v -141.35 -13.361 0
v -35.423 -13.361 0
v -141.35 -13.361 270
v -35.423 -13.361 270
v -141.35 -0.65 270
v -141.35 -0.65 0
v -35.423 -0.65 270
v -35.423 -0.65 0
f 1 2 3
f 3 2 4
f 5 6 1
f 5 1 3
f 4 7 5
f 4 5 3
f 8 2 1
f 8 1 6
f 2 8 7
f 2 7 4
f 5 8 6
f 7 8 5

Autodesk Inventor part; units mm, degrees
ref_plane "YZ Plane" through (0, 0, 0) normal (1, 0, 0) x (0, 1, 0)
ref_plane "XZ Plane" through (0, 0, 0) normal (0, 1, 0) x (-1, 0, 0)
ref_plane "XY Plane" through (0, 0, 0) normal (0, 0, 1) x (1, 0, 0)
sketch "Sketch1" plane through (0, 0, 0) normal (0, 0, 1) x (1, 0, 0)
  line L0 (-135, -7) -> (-35.423, -7) projected
  line L1 (-128.65, -70.65) -> (-128.65, -7) projected
  line L2 (135, -70.65) -> (-135, -70.65) projected
  line L3 (-128.65, -7) -> (-35.423, -7)
  line L4 (-35.423, -7) -> (-35.423, -13.3614)
  line L5 (-35.423, -13.3614) -> (-128.65, -13.3614)
  line L6 (-128.65, -13.3614) -> (-128.65, -7)
  point P0 (0, 0)
extrude "Extrusion1" add sketch "Sketch1" along normal blind 270
sketch "Sketch2" plane through (-128.65, -7, 0) normal (0, 1, 0) x (1, 0, 0)
  line L0 (93.227, -270) -> (0, -270) projected
  line L1 (93.227, 0) -> (0, 0) projected
  line L2 (0, -270) -> (93.227, -270)
  line L3 (93.227, -270) -> (93.227, 0)
  line L4 (93.227, 0) -> (0, 0)
  line L5 (0, 0) -> (0, -270)
  point P0 (128.65, 0)
extrude "Extrusion2" add sketch "Sketch2" along normal blind 6.35
sketch "Sketch3" plane through (-128.65, -13.3614, 0) normal (-1, 0, 0) x (0, 0, 1)
  line L0 (0, 0) -> (270, 0) projected
  line L1 (0, 0) -> (0, 12.7114) projected
  line L2 (270, 0) -> (0, 0)
  line L3 (0, 0) -> (0, 12.7114)
  line L4 (0, 12.7114) -> (270, 12.7114)
  line L5 (270, 12.7114) -> (270, 0)
  point P0 (0, 13.3614)
extrude "Extrusion3" add sketch "Sketch3" along normal blind 12.7
properties part number "Arm Rest" material "Wood (Birch)"
